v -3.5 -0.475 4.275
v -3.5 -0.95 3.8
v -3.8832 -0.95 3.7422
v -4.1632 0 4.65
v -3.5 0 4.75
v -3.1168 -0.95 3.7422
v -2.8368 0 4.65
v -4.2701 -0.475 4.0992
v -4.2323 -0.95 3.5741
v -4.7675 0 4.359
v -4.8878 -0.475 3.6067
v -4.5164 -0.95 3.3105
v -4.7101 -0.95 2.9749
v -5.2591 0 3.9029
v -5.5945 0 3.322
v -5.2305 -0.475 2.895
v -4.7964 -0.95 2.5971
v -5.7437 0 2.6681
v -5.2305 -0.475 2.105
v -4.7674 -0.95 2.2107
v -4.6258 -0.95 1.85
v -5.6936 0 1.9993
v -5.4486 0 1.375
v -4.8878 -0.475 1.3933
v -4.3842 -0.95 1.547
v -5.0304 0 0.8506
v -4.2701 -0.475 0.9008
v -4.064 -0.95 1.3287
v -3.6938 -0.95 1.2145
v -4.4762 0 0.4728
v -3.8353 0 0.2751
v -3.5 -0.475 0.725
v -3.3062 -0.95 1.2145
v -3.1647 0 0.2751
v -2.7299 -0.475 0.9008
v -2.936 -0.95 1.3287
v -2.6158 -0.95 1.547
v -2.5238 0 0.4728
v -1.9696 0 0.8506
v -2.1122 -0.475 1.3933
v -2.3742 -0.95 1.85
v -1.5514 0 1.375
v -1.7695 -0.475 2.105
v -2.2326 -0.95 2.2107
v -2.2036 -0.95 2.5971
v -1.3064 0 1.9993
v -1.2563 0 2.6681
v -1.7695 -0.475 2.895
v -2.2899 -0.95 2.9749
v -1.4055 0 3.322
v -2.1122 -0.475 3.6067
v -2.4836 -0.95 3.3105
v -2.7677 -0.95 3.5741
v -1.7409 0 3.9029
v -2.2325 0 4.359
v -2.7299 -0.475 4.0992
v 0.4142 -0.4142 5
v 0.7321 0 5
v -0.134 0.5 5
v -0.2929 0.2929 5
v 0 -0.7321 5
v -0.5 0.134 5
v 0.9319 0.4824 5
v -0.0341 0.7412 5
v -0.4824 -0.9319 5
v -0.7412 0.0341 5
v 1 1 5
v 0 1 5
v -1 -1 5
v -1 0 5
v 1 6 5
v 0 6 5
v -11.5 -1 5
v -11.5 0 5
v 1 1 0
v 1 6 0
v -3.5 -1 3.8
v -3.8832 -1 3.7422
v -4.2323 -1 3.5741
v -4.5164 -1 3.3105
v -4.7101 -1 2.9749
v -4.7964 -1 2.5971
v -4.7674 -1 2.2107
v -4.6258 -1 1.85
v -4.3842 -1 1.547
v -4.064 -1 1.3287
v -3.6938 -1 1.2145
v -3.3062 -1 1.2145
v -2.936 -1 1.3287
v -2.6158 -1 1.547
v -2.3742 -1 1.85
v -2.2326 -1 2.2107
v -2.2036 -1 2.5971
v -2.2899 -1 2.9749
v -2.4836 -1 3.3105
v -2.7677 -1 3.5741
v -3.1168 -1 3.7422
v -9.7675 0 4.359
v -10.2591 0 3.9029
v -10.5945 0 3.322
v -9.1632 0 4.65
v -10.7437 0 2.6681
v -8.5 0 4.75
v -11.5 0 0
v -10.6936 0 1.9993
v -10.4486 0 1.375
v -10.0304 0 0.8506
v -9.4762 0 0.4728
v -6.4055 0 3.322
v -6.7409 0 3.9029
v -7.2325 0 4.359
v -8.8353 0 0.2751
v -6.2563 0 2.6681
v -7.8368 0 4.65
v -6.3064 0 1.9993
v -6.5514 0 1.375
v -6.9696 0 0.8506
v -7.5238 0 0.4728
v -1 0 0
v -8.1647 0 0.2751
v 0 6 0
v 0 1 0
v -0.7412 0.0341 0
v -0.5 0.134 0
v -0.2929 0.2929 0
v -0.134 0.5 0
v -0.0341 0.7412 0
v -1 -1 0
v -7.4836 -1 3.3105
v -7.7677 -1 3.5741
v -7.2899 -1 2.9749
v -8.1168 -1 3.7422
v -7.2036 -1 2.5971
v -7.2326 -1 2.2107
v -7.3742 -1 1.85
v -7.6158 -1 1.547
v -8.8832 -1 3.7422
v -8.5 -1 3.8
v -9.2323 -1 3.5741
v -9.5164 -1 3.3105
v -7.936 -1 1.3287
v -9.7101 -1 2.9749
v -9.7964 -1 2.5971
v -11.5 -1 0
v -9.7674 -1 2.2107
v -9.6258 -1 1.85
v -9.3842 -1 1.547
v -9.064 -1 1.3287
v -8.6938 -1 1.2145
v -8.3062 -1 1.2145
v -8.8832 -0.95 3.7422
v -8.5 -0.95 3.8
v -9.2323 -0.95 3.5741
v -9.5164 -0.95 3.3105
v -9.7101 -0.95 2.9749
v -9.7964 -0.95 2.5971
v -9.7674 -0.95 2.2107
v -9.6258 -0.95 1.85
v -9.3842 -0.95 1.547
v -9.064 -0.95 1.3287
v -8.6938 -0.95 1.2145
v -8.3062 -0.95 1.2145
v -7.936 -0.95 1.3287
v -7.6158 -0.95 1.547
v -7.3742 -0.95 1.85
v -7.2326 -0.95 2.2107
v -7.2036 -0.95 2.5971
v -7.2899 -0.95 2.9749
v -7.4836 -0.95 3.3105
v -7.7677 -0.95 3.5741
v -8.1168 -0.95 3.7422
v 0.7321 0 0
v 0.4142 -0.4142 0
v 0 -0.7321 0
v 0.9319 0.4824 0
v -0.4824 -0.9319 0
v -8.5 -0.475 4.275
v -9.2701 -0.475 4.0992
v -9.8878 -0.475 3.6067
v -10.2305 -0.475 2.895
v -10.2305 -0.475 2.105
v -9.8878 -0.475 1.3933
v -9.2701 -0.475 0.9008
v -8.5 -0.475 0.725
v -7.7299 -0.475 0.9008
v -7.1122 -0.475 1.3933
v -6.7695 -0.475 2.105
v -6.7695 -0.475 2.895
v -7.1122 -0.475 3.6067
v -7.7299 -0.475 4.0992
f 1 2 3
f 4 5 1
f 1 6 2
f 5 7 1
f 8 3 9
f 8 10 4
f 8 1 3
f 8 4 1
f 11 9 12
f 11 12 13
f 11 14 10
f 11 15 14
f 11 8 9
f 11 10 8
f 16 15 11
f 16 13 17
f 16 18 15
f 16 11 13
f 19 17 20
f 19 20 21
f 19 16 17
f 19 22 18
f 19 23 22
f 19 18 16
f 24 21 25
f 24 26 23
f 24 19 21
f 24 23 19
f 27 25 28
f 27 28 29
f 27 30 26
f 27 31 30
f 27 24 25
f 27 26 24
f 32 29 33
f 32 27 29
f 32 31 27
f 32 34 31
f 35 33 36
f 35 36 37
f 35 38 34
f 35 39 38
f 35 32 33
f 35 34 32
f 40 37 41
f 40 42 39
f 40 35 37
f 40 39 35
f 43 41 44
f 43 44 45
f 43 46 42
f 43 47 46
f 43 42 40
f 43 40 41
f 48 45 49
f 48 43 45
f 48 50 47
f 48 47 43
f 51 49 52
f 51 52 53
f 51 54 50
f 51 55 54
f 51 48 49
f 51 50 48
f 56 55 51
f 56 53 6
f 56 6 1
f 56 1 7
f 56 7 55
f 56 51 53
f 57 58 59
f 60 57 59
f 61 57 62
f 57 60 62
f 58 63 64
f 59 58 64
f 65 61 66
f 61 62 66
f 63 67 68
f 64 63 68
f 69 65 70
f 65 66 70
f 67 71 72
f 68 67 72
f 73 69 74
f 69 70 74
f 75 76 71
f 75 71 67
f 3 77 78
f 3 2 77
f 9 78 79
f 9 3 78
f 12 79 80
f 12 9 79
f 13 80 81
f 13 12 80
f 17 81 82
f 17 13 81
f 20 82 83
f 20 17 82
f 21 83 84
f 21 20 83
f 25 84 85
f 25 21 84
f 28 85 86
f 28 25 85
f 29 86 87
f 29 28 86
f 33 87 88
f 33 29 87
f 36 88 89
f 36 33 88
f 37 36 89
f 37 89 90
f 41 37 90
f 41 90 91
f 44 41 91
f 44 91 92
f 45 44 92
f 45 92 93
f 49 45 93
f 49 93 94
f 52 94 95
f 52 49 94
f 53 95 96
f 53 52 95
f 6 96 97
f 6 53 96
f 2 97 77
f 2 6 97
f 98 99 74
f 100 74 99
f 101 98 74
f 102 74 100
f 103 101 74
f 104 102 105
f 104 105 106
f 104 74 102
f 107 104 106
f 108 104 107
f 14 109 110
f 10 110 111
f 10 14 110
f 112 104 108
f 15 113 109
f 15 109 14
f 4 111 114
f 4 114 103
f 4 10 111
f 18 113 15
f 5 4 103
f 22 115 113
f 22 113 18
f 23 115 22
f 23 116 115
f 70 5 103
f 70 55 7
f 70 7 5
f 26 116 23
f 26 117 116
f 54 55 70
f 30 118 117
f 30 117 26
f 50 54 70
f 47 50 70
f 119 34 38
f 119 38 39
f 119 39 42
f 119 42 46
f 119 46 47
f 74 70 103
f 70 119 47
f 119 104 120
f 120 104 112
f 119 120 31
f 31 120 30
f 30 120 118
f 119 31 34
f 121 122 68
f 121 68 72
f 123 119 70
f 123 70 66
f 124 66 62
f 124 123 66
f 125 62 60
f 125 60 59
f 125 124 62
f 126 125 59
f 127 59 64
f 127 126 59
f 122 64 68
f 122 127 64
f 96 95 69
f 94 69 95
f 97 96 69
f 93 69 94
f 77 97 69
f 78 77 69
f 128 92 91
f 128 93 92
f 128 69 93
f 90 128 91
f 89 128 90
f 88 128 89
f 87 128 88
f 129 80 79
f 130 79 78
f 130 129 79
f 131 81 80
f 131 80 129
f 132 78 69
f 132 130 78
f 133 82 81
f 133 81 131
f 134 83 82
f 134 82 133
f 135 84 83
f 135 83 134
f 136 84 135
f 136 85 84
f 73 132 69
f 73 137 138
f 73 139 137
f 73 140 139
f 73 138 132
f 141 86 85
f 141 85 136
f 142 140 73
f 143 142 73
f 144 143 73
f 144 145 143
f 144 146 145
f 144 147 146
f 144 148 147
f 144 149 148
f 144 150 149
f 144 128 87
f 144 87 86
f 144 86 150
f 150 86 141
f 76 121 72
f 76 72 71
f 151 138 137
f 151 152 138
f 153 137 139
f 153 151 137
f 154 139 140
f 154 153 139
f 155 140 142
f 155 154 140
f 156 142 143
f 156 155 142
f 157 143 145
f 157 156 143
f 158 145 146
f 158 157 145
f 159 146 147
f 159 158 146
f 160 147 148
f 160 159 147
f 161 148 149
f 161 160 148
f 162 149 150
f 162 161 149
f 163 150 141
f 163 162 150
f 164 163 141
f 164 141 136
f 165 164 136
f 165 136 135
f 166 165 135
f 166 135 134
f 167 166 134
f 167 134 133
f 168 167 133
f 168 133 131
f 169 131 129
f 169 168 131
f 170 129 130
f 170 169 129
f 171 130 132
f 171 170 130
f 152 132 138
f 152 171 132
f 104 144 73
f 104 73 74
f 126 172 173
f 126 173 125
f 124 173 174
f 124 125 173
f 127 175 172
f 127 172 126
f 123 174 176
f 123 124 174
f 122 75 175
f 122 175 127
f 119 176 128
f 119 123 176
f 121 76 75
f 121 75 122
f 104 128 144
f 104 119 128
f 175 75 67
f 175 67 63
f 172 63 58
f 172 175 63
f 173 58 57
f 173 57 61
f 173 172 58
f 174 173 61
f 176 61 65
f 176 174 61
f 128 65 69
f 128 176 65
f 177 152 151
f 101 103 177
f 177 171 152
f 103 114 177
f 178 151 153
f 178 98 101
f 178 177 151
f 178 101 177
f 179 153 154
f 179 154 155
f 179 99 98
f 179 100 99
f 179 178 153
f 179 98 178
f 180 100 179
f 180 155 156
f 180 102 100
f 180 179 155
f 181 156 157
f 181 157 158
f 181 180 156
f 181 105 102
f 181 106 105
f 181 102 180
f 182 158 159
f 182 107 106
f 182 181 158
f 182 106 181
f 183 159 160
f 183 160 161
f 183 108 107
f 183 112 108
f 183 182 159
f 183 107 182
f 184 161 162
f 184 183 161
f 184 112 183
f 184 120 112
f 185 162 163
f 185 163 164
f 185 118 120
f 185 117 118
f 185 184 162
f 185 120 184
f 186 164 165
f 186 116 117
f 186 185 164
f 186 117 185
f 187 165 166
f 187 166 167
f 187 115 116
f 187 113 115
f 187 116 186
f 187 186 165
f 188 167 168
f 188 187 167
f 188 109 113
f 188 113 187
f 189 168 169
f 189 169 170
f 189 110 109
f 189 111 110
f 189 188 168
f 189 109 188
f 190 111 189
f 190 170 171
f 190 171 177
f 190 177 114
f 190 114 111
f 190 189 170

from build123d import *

# Parameters (mm, degrees)
BASE_FLANGE1_DEPTH                          = 5
CSK_FOR_M2_CROSS_RECESSED_CTSK_HEAD_2_COUNT = 2
CSK_FOR_M2_CROSS_RECESSED_CTSK_HEAD_2_PITCH = 5


# Sheet-metal steps are written as plain solids
with BuildPart() as part:
    # Sketch1 → Base-Flange1 (new body)
    with BuildSketch(Plane.XY):
        with BuildLine():
            Line((-11.5, 0), (-1, 0))
            ThreePointArc((-1, 0), (-0.292893219, 0.292893219), (0, 1))
            Line((0, 1), (0, 6))
            Line((0, 6), (1, 6))
            Line((1, 6), (1, 1))
            ThreePointArc((1, 1), (0.414213562, -0.414213562), (-1, -1))
            Line((-1, -1), (-11.5, -1))
            Line((-11.5, -1), (-11.5, 0))
        make_face()
    extrude(amount=BASE_FLANGE1_DEPTH)

    # Sketch3 → CSK for M2 Cross recessed CTSK head wood screws1 (revolve, cut)
    with BuildSketch(Plane(origin=(-8.5, 0, 2.5), x_dir=(0, 0, 1), z_dir=(1, 0, 0))):
        Polygon((0, 0), (0, 1), (1.3, 1), (1.3, 0.95), (2.25, 0), align=None)
    csk_for_m2_cross_recessed_ctsk_head_wood = revolve(axis=Axis((-8.5, 6.35, 2.5), (0, -1, 0)), mode=Mode.SUBTRACT)

    # CSK for M2 Cross recessed CTSK head  2: CSK for M2 Cross recessed CTSK head wood screws1 ×2
    with Locations(*[(i * CSK_FOR_M2_CROSS_RECESSED_CTSK_HEAD_2_PITCH, 0, 0) for i in range(1, CSK_FOR_M2_CROSS_RECESSED_CTSK_HEAD_2_COUNT)]):
        add(csk_for_m2_cross_recessed_ctsk_head_wood, mode=Mode.SUBTRACT)


solid = part.part
